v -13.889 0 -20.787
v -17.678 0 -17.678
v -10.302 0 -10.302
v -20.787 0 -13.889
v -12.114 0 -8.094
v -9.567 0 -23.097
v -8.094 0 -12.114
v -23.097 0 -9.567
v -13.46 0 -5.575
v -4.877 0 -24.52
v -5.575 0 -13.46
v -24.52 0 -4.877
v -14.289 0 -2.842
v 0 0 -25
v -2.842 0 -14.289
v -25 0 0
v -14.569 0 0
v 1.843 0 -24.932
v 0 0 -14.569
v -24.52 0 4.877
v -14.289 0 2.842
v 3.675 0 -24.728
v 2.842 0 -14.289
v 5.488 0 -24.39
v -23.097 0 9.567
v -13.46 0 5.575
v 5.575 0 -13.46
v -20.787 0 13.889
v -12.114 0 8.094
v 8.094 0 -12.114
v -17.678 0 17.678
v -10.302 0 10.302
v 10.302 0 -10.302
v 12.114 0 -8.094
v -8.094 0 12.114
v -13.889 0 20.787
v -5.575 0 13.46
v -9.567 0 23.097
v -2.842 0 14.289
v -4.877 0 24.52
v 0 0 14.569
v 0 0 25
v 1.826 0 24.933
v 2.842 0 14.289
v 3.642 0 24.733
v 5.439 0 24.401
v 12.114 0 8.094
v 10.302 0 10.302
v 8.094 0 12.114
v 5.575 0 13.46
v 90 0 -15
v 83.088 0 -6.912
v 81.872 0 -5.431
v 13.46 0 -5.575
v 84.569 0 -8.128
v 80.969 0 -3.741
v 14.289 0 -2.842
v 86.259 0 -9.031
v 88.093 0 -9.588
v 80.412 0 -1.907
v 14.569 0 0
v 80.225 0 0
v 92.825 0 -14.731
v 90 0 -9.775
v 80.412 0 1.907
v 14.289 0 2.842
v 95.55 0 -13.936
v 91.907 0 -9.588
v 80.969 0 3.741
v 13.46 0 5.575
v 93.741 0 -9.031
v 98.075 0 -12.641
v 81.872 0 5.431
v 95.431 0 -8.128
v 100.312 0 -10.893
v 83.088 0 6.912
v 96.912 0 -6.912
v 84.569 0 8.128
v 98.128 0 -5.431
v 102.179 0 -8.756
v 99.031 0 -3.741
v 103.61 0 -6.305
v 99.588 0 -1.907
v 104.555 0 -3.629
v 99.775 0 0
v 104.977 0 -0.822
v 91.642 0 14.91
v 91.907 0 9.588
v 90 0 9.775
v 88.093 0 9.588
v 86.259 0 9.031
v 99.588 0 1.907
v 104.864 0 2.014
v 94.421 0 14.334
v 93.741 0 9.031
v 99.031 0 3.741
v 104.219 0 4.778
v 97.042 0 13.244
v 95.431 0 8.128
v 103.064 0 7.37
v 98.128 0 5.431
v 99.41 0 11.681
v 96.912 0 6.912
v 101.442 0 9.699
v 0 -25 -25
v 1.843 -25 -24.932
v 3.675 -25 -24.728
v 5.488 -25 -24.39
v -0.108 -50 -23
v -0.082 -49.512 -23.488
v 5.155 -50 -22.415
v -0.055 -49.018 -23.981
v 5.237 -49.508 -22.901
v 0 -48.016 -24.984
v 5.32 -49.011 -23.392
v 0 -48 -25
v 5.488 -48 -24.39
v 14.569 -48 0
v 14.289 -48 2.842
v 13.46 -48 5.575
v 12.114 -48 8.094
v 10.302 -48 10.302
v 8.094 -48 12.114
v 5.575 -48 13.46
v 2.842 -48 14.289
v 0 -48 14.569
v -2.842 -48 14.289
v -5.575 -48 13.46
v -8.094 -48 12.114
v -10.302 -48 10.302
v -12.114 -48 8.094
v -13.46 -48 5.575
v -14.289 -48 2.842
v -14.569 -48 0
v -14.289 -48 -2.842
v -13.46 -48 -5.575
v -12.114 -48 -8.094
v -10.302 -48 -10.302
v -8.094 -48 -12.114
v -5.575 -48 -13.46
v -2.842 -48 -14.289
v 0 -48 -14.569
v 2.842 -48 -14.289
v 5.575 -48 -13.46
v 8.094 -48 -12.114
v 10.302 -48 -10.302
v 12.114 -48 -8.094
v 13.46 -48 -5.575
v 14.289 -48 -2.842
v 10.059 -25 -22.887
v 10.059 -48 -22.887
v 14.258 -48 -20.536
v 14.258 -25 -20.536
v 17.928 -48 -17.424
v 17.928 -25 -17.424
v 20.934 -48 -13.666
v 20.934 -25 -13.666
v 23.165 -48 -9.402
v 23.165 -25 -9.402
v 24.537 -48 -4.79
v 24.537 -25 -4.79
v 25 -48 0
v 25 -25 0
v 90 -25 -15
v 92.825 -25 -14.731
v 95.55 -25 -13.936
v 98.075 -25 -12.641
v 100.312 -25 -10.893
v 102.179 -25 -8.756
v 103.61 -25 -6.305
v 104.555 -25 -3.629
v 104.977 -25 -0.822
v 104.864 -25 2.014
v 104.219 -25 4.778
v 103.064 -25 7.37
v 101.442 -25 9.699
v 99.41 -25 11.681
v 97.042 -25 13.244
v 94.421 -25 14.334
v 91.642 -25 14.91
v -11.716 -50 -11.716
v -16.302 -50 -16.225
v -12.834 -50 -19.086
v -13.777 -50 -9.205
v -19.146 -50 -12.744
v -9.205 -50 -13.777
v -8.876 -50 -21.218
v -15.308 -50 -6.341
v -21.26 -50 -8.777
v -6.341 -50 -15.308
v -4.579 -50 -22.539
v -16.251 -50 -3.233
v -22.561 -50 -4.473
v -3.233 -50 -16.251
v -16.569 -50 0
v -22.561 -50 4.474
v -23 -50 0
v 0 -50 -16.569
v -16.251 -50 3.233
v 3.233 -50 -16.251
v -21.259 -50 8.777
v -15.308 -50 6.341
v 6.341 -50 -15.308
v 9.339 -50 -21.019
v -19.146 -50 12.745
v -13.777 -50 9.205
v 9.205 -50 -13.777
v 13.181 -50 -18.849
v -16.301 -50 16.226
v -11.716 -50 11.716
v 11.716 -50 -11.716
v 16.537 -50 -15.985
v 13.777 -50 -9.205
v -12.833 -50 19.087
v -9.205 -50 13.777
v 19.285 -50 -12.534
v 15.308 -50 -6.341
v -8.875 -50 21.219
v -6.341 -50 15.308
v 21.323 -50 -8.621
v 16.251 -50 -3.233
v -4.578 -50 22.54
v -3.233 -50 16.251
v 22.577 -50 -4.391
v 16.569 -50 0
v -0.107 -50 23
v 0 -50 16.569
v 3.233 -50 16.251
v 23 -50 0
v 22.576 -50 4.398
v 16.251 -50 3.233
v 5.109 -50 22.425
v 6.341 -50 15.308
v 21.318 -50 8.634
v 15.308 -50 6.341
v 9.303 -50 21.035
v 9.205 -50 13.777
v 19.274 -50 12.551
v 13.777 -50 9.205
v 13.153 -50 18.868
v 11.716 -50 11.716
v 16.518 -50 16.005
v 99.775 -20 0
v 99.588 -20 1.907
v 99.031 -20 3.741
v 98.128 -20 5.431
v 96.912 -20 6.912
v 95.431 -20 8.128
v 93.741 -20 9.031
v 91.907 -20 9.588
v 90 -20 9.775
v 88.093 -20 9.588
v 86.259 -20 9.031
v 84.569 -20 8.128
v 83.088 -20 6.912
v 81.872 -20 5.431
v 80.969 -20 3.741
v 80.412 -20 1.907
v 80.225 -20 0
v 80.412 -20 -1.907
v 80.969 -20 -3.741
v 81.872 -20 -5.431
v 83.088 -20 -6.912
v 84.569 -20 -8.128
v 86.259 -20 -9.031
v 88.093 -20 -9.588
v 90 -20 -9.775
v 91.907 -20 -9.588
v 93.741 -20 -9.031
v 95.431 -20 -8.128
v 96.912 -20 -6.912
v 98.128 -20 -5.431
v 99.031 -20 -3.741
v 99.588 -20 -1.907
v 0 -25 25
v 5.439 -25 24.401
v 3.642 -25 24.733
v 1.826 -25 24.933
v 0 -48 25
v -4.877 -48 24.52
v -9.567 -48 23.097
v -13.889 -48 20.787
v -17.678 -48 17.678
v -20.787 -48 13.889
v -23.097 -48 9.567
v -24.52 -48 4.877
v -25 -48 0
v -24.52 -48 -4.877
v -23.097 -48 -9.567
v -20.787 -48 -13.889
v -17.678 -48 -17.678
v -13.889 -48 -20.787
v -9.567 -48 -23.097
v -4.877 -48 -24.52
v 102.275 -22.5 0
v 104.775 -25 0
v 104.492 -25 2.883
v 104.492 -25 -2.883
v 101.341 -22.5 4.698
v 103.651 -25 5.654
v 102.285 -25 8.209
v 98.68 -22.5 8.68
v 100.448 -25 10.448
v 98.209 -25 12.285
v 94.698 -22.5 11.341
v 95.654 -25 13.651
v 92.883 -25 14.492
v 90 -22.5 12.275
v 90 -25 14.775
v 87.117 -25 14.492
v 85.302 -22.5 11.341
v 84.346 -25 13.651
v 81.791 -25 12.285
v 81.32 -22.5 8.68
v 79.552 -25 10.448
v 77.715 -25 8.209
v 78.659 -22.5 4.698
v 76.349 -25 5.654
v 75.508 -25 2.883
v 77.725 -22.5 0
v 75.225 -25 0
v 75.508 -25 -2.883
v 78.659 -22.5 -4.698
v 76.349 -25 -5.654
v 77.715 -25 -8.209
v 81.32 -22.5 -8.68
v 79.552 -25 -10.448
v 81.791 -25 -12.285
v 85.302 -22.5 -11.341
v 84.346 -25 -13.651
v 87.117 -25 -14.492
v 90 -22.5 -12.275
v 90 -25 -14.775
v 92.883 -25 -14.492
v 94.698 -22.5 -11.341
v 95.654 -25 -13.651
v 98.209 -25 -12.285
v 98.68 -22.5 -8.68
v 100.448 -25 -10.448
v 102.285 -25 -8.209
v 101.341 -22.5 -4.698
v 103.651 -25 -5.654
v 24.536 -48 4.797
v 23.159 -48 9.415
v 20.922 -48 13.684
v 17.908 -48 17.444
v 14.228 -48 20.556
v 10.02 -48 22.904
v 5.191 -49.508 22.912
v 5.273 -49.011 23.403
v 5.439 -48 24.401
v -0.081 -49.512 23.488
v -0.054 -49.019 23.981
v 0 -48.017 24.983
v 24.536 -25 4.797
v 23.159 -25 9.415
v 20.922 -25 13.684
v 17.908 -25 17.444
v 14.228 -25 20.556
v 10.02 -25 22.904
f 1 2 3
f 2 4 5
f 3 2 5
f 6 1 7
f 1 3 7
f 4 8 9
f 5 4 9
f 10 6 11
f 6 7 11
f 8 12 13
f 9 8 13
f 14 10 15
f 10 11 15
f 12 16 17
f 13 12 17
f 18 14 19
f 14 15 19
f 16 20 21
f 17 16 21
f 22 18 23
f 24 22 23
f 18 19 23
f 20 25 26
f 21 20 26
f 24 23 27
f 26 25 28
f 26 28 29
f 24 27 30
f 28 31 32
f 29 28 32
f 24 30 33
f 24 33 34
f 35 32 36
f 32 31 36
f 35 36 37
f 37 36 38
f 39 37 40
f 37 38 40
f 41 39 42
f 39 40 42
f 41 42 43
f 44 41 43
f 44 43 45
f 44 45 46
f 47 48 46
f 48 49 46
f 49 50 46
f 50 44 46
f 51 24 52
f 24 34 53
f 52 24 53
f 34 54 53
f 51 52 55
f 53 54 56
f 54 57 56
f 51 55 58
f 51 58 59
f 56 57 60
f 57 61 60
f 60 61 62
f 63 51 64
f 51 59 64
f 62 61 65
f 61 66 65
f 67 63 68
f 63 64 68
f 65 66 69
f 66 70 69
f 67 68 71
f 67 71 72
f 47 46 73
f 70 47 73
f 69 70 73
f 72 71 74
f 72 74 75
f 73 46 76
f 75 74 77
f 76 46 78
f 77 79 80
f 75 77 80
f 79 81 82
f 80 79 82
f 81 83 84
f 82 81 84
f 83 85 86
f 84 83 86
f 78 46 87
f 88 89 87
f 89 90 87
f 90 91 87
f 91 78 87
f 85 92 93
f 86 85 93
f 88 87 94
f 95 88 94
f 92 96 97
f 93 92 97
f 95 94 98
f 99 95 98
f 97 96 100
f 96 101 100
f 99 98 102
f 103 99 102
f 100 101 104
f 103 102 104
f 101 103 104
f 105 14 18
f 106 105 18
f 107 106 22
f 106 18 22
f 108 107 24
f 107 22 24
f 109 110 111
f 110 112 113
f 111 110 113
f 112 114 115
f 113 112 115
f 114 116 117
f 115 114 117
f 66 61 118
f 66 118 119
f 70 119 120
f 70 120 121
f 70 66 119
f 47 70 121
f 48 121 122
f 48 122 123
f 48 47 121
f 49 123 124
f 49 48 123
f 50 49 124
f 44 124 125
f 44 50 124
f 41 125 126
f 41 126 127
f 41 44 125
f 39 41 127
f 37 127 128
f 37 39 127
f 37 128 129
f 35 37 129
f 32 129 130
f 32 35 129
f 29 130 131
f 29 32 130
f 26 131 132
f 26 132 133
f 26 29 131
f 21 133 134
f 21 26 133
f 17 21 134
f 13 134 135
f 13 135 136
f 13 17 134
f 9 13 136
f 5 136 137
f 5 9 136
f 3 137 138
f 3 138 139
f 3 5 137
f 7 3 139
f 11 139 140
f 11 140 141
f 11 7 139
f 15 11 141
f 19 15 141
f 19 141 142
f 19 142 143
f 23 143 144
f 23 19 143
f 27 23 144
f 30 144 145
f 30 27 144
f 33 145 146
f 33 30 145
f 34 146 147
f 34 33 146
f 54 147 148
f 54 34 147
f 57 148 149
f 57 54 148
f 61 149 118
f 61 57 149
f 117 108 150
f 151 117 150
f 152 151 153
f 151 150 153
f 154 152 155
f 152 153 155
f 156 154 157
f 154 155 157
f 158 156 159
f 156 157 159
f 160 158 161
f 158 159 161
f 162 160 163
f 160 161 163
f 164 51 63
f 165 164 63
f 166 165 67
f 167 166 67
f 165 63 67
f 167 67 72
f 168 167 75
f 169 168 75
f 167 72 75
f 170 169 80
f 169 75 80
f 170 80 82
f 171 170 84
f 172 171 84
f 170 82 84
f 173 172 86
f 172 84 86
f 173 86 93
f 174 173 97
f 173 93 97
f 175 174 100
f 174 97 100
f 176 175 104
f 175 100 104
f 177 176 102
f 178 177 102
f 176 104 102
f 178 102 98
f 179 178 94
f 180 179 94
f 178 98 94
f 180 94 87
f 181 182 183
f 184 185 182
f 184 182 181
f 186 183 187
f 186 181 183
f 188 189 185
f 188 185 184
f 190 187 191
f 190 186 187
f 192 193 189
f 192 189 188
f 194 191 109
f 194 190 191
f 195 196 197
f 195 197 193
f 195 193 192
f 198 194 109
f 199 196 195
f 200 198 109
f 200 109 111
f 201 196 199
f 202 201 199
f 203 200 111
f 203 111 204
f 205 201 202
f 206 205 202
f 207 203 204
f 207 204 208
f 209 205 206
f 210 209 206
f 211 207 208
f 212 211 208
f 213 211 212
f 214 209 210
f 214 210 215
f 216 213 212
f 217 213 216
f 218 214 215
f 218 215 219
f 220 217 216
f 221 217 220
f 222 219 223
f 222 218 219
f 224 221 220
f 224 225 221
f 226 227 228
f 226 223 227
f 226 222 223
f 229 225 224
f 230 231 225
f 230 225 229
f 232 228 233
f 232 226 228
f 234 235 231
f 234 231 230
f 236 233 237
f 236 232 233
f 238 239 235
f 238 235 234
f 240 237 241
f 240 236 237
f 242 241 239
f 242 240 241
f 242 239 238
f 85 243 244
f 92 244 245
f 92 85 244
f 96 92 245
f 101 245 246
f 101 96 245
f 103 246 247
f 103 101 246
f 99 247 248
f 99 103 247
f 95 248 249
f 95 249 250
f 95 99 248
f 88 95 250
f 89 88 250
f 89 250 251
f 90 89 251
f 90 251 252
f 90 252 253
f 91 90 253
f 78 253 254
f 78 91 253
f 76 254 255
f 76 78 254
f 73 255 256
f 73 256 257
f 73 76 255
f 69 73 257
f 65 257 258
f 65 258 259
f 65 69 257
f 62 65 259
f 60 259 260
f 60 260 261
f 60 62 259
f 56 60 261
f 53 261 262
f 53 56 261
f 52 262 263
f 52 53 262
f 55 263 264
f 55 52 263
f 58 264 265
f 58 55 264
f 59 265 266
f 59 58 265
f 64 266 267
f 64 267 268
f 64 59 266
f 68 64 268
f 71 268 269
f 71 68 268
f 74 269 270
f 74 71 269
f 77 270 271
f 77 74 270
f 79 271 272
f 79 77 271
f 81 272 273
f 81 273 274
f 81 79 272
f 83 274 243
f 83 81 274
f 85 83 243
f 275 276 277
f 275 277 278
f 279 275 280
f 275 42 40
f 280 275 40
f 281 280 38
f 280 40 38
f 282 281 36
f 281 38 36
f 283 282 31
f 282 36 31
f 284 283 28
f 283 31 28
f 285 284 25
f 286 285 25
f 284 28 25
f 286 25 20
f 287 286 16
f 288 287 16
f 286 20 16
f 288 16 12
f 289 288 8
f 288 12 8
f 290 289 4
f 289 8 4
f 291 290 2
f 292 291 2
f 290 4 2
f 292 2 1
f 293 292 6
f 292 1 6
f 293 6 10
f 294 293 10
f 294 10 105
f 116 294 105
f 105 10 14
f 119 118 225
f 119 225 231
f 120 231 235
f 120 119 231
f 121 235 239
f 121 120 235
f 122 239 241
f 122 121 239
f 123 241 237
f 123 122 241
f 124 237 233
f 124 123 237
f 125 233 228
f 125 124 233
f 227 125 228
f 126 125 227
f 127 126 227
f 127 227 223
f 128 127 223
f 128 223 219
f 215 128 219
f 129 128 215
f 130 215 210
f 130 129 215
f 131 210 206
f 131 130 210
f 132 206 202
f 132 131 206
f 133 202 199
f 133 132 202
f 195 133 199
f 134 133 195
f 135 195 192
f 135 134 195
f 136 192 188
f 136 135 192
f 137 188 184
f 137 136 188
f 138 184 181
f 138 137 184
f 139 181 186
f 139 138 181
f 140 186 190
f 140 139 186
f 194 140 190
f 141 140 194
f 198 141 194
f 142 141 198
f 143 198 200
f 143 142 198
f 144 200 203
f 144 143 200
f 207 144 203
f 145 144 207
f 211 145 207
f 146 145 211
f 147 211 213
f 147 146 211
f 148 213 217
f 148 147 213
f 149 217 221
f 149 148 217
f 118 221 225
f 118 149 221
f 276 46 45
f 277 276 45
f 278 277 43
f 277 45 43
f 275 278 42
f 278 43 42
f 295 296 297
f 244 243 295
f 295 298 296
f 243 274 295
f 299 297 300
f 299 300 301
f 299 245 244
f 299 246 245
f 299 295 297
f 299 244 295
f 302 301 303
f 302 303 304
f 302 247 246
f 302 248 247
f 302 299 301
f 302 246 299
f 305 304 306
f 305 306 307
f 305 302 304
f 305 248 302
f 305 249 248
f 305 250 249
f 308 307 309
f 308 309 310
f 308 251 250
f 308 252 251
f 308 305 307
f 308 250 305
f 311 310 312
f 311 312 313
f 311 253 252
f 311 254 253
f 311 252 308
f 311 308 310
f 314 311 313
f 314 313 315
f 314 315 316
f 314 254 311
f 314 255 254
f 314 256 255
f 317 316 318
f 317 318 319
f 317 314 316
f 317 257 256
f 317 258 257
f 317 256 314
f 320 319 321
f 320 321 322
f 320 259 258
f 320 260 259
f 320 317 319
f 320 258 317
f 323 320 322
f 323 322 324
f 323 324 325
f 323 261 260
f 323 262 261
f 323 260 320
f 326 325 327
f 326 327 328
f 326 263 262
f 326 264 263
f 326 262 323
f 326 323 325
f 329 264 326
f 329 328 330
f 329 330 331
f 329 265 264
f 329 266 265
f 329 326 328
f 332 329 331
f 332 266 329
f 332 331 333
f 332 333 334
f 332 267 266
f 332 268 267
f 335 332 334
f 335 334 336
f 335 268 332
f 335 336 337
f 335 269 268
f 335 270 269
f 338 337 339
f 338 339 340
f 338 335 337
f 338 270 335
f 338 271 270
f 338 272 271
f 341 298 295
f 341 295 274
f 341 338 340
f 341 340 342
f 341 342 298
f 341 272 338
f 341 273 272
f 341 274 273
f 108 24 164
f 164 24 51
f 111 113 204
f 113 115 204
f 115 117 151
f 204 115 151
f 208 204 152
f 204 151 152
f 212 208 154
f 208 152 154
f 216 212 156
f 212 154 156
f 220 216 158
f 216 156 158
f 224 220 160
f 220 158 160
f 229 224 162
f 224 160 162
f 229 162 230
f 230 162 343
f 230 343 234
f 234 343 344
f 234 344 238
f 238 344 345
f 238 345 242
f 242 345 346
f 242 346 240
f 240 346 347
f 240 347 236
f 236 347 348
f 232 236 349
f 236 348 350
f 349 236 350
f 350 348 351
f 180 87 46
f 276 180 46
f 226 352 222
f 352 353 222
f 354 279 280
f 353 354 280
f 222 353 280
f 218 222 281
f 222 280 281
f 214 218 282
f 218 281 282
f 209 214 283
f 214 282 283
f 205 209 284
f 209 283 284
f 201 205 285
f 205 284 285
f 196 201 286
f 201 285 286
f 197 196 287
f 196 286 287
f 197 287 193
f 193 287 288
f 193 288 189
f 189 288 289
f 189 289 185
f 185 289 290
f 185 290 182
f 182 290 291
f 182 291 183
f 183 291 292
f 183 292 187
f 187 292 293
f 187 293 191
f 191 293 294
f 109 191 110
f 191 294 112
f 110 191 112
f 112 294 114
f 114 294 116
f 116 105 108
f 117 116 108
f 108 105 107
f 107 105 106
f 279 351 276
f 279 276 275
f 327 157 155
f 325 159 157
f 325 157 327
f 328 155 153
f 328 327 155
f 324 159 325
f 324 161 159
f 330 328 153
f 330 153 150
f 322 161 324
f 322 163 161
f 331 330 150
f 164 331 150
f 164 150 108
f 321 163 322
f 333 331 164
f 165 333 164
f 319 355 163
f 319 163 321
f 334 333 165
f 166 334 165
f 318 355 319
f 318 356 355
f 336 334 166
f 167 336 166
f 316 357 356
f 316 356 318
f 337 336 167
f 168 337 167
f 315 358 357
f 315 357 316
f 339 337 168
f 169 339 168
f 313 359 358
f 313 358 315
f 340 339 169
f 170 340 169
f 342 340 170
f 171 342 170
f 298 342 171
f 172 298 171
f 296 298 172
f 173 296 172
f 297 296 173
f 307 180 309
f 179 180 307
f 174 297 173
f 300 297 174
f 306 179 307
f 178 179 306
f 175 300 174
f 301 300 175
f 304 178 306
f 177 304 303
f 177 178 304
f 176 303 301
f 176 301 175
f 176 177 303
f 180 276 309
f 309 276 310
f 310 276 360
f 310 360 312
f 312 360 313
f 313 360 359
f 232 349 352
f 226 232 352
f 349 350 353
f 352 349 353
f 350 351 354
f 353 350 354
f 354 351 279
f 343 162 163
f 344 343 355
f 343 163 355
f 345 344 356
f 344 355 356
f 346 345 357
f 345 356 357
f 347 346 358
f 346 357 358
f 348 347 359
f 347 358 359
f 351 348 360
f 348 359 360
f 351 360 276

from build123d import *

# Parameters (mm, degrees)
F0_R       = 14.5692591233
F0_R_2     = 9.7754481422
F1_DEPTH   = 25
F2_DEPTH   = 50
F3_C1_SIZE = 2
F3_C2_SIZE = 2
F3_C3_SIZE = 1.9999
F3_C4_SIZE = 1.9999
F3_C5_SIZE = 1.9999
F4_SIZE    = 5


# Not quite as in the source:
# - a fillet or chamfer is up to 0.001 mm smaller than in the source, because OpenCascade refuses the exact size


with BuildPart() as f1:
    # F0 (on Front) → F1 (new body)
    with BuildSketch(Plane.XZ):
        with BuildLine():
            Line((5.4392563459, 24.4011165811), (0, 25))
            ThreePointArc((0, 25), (-25, 0), (0, -25))
            Line((0, -25), (5.487804878, -24.3902439024))
            ThreePointArc((5.487804878, -24.3902439024), (19.5217202361, -15.6173761889), (25, 0))
            ThreePointArc((25, 0), (19.5061709293, 15.6367930113), (5.4392563459, 24.4011165811))
        make_face()
        Circle(F0_R, mode=Mode.SUBTRACT)
        with BuildLine():
            ThreePointArc((5.4392563459, 24.4011165811), (2.7360633648, 24.8498281134), (0, 25))
            Line((0, 25), (5.4392563459, 24.4011165811))
        make_face()
        with BuildLine():
            Line((5.487804878, -24.3902439024), (0, -25))
            ThreePointArc((0, -25), (2.7607881519, -24.8470933668), (5.487804878, -24.3902439024))
        make_face()
        with BuildLine():
            Line((91.6416380189, 14.909896868), (5.4392563459, 24.4011165811))
            ThreePointArc((5.4392563459, 24.4011165811), (19.5061709293, 15.6367930113), (25, 0))
            ThreePointArc((25, 0), (19.5217202361, -15.6173761889), (5.487804878, -24.3902439024))
            Line((5.487804878, -24.3902439024), (90, -15))
            ThreePointArc((90, -15), (75.0225427221, 0.8220544324), (91.6416380189, 14.909896868))
        make_face()
        with BuildLine():
            ThreePointArc((105, 0), (101.1719418698, 10.0093813424), (91.6416380189, 14.909896868))
            ThreePointArc((91.6416380189, 14.909896868), (75.0225427221, 0.8220544324), (90, -15))
            ThreePointArc((90, -15), (100.6066017178, -10.6066017178), (105, 0))
        make_face()
        with Locations((90, 0)):
            Circle(F0_R_2, mode=Mode.SUBTRACT)
    extrude(amount=F1_DEPTH)

    # F0 (on Front) → F2 (join)
    with BuildSketch(Plane.XZ):
        with BuildLine():
            Line((5.4392563459, 24.4011165811), (0, 25))
            ThreePointArc((0, 25), (-25, 0), (0, -25))
            Line((0, -25), (5.487804878, -24.3902439024))
            ThreePointArc((5.487804878, -24.3902439024), (19.5217202361, -15.6173761889), (25, 0))
            ThreePointArc((25, 0), (19.5061709293, 15.6367930113), (5.4392563459, 24.4011165811))
        make_face()
        Circle(F0_R, mode=Mode.SUBTRACT)
    extrude(amount=F2_DEPTH)

    # F3: chamfer of 2 on 5 edges, made by hand

    # F3_c1
    f3_c1_edges = [f1.edges().sort_by_distance(p)[0] for p in [
        (-14.5692591233, -50, 0),
    ]]
    chamfer(f3_c1_edges, length=F3_C1_SIZE)

    # F3_c2
    f3_c2_edges = [f1.edges().sort_by_distance(p)[0] for p in [
        (-25, -50, 0),
    ]]
    chamfer(f3_c2_edges, length=F3_C2_SIZE)

    # F3_c3 (size 2 in the source; OpenCascade refuses exactly that, so slightly less here)
    f3_c3_edges = [f1.edges().sort_by_distance(p)[0] for p in [
        (3.7377861737, -50, -24.5846904251),
    ]]
    chamfer(f3_c3_edges, length=F3_C3_SIZE)

    # F3_c4 (size 2 in the source; OpenCascade refuses exactly that, so slightly less here)
    f3_c4_edges = [f1.edges().sort_by_distance(p)[0] for p in [
        (3.7136212975, -50, 24.591115756),
    ]]
    chamfer(f3_c4_edges, length=F3_C4_SIZE)

    # F3_c5 (size 2 in the source; OpenCascade refuses exactly that, so slightly less here)
    f3_c5_edges = [f1.edges().sort_by_distance(p)[0] for p in [
        (24.9999950028, -50, 0.0158069943),
    ]]
    chamfer(f3_c5_edges, length=F3_C5_SIZE)

    # F4
    f4_edges = [f1.edges().sort_by_distance(p)[0] for p in [
        (80.224552, -25, 0),
    ]]
    chamfer(f4_edges, length=F4_SIZE)


solid = f1.part
